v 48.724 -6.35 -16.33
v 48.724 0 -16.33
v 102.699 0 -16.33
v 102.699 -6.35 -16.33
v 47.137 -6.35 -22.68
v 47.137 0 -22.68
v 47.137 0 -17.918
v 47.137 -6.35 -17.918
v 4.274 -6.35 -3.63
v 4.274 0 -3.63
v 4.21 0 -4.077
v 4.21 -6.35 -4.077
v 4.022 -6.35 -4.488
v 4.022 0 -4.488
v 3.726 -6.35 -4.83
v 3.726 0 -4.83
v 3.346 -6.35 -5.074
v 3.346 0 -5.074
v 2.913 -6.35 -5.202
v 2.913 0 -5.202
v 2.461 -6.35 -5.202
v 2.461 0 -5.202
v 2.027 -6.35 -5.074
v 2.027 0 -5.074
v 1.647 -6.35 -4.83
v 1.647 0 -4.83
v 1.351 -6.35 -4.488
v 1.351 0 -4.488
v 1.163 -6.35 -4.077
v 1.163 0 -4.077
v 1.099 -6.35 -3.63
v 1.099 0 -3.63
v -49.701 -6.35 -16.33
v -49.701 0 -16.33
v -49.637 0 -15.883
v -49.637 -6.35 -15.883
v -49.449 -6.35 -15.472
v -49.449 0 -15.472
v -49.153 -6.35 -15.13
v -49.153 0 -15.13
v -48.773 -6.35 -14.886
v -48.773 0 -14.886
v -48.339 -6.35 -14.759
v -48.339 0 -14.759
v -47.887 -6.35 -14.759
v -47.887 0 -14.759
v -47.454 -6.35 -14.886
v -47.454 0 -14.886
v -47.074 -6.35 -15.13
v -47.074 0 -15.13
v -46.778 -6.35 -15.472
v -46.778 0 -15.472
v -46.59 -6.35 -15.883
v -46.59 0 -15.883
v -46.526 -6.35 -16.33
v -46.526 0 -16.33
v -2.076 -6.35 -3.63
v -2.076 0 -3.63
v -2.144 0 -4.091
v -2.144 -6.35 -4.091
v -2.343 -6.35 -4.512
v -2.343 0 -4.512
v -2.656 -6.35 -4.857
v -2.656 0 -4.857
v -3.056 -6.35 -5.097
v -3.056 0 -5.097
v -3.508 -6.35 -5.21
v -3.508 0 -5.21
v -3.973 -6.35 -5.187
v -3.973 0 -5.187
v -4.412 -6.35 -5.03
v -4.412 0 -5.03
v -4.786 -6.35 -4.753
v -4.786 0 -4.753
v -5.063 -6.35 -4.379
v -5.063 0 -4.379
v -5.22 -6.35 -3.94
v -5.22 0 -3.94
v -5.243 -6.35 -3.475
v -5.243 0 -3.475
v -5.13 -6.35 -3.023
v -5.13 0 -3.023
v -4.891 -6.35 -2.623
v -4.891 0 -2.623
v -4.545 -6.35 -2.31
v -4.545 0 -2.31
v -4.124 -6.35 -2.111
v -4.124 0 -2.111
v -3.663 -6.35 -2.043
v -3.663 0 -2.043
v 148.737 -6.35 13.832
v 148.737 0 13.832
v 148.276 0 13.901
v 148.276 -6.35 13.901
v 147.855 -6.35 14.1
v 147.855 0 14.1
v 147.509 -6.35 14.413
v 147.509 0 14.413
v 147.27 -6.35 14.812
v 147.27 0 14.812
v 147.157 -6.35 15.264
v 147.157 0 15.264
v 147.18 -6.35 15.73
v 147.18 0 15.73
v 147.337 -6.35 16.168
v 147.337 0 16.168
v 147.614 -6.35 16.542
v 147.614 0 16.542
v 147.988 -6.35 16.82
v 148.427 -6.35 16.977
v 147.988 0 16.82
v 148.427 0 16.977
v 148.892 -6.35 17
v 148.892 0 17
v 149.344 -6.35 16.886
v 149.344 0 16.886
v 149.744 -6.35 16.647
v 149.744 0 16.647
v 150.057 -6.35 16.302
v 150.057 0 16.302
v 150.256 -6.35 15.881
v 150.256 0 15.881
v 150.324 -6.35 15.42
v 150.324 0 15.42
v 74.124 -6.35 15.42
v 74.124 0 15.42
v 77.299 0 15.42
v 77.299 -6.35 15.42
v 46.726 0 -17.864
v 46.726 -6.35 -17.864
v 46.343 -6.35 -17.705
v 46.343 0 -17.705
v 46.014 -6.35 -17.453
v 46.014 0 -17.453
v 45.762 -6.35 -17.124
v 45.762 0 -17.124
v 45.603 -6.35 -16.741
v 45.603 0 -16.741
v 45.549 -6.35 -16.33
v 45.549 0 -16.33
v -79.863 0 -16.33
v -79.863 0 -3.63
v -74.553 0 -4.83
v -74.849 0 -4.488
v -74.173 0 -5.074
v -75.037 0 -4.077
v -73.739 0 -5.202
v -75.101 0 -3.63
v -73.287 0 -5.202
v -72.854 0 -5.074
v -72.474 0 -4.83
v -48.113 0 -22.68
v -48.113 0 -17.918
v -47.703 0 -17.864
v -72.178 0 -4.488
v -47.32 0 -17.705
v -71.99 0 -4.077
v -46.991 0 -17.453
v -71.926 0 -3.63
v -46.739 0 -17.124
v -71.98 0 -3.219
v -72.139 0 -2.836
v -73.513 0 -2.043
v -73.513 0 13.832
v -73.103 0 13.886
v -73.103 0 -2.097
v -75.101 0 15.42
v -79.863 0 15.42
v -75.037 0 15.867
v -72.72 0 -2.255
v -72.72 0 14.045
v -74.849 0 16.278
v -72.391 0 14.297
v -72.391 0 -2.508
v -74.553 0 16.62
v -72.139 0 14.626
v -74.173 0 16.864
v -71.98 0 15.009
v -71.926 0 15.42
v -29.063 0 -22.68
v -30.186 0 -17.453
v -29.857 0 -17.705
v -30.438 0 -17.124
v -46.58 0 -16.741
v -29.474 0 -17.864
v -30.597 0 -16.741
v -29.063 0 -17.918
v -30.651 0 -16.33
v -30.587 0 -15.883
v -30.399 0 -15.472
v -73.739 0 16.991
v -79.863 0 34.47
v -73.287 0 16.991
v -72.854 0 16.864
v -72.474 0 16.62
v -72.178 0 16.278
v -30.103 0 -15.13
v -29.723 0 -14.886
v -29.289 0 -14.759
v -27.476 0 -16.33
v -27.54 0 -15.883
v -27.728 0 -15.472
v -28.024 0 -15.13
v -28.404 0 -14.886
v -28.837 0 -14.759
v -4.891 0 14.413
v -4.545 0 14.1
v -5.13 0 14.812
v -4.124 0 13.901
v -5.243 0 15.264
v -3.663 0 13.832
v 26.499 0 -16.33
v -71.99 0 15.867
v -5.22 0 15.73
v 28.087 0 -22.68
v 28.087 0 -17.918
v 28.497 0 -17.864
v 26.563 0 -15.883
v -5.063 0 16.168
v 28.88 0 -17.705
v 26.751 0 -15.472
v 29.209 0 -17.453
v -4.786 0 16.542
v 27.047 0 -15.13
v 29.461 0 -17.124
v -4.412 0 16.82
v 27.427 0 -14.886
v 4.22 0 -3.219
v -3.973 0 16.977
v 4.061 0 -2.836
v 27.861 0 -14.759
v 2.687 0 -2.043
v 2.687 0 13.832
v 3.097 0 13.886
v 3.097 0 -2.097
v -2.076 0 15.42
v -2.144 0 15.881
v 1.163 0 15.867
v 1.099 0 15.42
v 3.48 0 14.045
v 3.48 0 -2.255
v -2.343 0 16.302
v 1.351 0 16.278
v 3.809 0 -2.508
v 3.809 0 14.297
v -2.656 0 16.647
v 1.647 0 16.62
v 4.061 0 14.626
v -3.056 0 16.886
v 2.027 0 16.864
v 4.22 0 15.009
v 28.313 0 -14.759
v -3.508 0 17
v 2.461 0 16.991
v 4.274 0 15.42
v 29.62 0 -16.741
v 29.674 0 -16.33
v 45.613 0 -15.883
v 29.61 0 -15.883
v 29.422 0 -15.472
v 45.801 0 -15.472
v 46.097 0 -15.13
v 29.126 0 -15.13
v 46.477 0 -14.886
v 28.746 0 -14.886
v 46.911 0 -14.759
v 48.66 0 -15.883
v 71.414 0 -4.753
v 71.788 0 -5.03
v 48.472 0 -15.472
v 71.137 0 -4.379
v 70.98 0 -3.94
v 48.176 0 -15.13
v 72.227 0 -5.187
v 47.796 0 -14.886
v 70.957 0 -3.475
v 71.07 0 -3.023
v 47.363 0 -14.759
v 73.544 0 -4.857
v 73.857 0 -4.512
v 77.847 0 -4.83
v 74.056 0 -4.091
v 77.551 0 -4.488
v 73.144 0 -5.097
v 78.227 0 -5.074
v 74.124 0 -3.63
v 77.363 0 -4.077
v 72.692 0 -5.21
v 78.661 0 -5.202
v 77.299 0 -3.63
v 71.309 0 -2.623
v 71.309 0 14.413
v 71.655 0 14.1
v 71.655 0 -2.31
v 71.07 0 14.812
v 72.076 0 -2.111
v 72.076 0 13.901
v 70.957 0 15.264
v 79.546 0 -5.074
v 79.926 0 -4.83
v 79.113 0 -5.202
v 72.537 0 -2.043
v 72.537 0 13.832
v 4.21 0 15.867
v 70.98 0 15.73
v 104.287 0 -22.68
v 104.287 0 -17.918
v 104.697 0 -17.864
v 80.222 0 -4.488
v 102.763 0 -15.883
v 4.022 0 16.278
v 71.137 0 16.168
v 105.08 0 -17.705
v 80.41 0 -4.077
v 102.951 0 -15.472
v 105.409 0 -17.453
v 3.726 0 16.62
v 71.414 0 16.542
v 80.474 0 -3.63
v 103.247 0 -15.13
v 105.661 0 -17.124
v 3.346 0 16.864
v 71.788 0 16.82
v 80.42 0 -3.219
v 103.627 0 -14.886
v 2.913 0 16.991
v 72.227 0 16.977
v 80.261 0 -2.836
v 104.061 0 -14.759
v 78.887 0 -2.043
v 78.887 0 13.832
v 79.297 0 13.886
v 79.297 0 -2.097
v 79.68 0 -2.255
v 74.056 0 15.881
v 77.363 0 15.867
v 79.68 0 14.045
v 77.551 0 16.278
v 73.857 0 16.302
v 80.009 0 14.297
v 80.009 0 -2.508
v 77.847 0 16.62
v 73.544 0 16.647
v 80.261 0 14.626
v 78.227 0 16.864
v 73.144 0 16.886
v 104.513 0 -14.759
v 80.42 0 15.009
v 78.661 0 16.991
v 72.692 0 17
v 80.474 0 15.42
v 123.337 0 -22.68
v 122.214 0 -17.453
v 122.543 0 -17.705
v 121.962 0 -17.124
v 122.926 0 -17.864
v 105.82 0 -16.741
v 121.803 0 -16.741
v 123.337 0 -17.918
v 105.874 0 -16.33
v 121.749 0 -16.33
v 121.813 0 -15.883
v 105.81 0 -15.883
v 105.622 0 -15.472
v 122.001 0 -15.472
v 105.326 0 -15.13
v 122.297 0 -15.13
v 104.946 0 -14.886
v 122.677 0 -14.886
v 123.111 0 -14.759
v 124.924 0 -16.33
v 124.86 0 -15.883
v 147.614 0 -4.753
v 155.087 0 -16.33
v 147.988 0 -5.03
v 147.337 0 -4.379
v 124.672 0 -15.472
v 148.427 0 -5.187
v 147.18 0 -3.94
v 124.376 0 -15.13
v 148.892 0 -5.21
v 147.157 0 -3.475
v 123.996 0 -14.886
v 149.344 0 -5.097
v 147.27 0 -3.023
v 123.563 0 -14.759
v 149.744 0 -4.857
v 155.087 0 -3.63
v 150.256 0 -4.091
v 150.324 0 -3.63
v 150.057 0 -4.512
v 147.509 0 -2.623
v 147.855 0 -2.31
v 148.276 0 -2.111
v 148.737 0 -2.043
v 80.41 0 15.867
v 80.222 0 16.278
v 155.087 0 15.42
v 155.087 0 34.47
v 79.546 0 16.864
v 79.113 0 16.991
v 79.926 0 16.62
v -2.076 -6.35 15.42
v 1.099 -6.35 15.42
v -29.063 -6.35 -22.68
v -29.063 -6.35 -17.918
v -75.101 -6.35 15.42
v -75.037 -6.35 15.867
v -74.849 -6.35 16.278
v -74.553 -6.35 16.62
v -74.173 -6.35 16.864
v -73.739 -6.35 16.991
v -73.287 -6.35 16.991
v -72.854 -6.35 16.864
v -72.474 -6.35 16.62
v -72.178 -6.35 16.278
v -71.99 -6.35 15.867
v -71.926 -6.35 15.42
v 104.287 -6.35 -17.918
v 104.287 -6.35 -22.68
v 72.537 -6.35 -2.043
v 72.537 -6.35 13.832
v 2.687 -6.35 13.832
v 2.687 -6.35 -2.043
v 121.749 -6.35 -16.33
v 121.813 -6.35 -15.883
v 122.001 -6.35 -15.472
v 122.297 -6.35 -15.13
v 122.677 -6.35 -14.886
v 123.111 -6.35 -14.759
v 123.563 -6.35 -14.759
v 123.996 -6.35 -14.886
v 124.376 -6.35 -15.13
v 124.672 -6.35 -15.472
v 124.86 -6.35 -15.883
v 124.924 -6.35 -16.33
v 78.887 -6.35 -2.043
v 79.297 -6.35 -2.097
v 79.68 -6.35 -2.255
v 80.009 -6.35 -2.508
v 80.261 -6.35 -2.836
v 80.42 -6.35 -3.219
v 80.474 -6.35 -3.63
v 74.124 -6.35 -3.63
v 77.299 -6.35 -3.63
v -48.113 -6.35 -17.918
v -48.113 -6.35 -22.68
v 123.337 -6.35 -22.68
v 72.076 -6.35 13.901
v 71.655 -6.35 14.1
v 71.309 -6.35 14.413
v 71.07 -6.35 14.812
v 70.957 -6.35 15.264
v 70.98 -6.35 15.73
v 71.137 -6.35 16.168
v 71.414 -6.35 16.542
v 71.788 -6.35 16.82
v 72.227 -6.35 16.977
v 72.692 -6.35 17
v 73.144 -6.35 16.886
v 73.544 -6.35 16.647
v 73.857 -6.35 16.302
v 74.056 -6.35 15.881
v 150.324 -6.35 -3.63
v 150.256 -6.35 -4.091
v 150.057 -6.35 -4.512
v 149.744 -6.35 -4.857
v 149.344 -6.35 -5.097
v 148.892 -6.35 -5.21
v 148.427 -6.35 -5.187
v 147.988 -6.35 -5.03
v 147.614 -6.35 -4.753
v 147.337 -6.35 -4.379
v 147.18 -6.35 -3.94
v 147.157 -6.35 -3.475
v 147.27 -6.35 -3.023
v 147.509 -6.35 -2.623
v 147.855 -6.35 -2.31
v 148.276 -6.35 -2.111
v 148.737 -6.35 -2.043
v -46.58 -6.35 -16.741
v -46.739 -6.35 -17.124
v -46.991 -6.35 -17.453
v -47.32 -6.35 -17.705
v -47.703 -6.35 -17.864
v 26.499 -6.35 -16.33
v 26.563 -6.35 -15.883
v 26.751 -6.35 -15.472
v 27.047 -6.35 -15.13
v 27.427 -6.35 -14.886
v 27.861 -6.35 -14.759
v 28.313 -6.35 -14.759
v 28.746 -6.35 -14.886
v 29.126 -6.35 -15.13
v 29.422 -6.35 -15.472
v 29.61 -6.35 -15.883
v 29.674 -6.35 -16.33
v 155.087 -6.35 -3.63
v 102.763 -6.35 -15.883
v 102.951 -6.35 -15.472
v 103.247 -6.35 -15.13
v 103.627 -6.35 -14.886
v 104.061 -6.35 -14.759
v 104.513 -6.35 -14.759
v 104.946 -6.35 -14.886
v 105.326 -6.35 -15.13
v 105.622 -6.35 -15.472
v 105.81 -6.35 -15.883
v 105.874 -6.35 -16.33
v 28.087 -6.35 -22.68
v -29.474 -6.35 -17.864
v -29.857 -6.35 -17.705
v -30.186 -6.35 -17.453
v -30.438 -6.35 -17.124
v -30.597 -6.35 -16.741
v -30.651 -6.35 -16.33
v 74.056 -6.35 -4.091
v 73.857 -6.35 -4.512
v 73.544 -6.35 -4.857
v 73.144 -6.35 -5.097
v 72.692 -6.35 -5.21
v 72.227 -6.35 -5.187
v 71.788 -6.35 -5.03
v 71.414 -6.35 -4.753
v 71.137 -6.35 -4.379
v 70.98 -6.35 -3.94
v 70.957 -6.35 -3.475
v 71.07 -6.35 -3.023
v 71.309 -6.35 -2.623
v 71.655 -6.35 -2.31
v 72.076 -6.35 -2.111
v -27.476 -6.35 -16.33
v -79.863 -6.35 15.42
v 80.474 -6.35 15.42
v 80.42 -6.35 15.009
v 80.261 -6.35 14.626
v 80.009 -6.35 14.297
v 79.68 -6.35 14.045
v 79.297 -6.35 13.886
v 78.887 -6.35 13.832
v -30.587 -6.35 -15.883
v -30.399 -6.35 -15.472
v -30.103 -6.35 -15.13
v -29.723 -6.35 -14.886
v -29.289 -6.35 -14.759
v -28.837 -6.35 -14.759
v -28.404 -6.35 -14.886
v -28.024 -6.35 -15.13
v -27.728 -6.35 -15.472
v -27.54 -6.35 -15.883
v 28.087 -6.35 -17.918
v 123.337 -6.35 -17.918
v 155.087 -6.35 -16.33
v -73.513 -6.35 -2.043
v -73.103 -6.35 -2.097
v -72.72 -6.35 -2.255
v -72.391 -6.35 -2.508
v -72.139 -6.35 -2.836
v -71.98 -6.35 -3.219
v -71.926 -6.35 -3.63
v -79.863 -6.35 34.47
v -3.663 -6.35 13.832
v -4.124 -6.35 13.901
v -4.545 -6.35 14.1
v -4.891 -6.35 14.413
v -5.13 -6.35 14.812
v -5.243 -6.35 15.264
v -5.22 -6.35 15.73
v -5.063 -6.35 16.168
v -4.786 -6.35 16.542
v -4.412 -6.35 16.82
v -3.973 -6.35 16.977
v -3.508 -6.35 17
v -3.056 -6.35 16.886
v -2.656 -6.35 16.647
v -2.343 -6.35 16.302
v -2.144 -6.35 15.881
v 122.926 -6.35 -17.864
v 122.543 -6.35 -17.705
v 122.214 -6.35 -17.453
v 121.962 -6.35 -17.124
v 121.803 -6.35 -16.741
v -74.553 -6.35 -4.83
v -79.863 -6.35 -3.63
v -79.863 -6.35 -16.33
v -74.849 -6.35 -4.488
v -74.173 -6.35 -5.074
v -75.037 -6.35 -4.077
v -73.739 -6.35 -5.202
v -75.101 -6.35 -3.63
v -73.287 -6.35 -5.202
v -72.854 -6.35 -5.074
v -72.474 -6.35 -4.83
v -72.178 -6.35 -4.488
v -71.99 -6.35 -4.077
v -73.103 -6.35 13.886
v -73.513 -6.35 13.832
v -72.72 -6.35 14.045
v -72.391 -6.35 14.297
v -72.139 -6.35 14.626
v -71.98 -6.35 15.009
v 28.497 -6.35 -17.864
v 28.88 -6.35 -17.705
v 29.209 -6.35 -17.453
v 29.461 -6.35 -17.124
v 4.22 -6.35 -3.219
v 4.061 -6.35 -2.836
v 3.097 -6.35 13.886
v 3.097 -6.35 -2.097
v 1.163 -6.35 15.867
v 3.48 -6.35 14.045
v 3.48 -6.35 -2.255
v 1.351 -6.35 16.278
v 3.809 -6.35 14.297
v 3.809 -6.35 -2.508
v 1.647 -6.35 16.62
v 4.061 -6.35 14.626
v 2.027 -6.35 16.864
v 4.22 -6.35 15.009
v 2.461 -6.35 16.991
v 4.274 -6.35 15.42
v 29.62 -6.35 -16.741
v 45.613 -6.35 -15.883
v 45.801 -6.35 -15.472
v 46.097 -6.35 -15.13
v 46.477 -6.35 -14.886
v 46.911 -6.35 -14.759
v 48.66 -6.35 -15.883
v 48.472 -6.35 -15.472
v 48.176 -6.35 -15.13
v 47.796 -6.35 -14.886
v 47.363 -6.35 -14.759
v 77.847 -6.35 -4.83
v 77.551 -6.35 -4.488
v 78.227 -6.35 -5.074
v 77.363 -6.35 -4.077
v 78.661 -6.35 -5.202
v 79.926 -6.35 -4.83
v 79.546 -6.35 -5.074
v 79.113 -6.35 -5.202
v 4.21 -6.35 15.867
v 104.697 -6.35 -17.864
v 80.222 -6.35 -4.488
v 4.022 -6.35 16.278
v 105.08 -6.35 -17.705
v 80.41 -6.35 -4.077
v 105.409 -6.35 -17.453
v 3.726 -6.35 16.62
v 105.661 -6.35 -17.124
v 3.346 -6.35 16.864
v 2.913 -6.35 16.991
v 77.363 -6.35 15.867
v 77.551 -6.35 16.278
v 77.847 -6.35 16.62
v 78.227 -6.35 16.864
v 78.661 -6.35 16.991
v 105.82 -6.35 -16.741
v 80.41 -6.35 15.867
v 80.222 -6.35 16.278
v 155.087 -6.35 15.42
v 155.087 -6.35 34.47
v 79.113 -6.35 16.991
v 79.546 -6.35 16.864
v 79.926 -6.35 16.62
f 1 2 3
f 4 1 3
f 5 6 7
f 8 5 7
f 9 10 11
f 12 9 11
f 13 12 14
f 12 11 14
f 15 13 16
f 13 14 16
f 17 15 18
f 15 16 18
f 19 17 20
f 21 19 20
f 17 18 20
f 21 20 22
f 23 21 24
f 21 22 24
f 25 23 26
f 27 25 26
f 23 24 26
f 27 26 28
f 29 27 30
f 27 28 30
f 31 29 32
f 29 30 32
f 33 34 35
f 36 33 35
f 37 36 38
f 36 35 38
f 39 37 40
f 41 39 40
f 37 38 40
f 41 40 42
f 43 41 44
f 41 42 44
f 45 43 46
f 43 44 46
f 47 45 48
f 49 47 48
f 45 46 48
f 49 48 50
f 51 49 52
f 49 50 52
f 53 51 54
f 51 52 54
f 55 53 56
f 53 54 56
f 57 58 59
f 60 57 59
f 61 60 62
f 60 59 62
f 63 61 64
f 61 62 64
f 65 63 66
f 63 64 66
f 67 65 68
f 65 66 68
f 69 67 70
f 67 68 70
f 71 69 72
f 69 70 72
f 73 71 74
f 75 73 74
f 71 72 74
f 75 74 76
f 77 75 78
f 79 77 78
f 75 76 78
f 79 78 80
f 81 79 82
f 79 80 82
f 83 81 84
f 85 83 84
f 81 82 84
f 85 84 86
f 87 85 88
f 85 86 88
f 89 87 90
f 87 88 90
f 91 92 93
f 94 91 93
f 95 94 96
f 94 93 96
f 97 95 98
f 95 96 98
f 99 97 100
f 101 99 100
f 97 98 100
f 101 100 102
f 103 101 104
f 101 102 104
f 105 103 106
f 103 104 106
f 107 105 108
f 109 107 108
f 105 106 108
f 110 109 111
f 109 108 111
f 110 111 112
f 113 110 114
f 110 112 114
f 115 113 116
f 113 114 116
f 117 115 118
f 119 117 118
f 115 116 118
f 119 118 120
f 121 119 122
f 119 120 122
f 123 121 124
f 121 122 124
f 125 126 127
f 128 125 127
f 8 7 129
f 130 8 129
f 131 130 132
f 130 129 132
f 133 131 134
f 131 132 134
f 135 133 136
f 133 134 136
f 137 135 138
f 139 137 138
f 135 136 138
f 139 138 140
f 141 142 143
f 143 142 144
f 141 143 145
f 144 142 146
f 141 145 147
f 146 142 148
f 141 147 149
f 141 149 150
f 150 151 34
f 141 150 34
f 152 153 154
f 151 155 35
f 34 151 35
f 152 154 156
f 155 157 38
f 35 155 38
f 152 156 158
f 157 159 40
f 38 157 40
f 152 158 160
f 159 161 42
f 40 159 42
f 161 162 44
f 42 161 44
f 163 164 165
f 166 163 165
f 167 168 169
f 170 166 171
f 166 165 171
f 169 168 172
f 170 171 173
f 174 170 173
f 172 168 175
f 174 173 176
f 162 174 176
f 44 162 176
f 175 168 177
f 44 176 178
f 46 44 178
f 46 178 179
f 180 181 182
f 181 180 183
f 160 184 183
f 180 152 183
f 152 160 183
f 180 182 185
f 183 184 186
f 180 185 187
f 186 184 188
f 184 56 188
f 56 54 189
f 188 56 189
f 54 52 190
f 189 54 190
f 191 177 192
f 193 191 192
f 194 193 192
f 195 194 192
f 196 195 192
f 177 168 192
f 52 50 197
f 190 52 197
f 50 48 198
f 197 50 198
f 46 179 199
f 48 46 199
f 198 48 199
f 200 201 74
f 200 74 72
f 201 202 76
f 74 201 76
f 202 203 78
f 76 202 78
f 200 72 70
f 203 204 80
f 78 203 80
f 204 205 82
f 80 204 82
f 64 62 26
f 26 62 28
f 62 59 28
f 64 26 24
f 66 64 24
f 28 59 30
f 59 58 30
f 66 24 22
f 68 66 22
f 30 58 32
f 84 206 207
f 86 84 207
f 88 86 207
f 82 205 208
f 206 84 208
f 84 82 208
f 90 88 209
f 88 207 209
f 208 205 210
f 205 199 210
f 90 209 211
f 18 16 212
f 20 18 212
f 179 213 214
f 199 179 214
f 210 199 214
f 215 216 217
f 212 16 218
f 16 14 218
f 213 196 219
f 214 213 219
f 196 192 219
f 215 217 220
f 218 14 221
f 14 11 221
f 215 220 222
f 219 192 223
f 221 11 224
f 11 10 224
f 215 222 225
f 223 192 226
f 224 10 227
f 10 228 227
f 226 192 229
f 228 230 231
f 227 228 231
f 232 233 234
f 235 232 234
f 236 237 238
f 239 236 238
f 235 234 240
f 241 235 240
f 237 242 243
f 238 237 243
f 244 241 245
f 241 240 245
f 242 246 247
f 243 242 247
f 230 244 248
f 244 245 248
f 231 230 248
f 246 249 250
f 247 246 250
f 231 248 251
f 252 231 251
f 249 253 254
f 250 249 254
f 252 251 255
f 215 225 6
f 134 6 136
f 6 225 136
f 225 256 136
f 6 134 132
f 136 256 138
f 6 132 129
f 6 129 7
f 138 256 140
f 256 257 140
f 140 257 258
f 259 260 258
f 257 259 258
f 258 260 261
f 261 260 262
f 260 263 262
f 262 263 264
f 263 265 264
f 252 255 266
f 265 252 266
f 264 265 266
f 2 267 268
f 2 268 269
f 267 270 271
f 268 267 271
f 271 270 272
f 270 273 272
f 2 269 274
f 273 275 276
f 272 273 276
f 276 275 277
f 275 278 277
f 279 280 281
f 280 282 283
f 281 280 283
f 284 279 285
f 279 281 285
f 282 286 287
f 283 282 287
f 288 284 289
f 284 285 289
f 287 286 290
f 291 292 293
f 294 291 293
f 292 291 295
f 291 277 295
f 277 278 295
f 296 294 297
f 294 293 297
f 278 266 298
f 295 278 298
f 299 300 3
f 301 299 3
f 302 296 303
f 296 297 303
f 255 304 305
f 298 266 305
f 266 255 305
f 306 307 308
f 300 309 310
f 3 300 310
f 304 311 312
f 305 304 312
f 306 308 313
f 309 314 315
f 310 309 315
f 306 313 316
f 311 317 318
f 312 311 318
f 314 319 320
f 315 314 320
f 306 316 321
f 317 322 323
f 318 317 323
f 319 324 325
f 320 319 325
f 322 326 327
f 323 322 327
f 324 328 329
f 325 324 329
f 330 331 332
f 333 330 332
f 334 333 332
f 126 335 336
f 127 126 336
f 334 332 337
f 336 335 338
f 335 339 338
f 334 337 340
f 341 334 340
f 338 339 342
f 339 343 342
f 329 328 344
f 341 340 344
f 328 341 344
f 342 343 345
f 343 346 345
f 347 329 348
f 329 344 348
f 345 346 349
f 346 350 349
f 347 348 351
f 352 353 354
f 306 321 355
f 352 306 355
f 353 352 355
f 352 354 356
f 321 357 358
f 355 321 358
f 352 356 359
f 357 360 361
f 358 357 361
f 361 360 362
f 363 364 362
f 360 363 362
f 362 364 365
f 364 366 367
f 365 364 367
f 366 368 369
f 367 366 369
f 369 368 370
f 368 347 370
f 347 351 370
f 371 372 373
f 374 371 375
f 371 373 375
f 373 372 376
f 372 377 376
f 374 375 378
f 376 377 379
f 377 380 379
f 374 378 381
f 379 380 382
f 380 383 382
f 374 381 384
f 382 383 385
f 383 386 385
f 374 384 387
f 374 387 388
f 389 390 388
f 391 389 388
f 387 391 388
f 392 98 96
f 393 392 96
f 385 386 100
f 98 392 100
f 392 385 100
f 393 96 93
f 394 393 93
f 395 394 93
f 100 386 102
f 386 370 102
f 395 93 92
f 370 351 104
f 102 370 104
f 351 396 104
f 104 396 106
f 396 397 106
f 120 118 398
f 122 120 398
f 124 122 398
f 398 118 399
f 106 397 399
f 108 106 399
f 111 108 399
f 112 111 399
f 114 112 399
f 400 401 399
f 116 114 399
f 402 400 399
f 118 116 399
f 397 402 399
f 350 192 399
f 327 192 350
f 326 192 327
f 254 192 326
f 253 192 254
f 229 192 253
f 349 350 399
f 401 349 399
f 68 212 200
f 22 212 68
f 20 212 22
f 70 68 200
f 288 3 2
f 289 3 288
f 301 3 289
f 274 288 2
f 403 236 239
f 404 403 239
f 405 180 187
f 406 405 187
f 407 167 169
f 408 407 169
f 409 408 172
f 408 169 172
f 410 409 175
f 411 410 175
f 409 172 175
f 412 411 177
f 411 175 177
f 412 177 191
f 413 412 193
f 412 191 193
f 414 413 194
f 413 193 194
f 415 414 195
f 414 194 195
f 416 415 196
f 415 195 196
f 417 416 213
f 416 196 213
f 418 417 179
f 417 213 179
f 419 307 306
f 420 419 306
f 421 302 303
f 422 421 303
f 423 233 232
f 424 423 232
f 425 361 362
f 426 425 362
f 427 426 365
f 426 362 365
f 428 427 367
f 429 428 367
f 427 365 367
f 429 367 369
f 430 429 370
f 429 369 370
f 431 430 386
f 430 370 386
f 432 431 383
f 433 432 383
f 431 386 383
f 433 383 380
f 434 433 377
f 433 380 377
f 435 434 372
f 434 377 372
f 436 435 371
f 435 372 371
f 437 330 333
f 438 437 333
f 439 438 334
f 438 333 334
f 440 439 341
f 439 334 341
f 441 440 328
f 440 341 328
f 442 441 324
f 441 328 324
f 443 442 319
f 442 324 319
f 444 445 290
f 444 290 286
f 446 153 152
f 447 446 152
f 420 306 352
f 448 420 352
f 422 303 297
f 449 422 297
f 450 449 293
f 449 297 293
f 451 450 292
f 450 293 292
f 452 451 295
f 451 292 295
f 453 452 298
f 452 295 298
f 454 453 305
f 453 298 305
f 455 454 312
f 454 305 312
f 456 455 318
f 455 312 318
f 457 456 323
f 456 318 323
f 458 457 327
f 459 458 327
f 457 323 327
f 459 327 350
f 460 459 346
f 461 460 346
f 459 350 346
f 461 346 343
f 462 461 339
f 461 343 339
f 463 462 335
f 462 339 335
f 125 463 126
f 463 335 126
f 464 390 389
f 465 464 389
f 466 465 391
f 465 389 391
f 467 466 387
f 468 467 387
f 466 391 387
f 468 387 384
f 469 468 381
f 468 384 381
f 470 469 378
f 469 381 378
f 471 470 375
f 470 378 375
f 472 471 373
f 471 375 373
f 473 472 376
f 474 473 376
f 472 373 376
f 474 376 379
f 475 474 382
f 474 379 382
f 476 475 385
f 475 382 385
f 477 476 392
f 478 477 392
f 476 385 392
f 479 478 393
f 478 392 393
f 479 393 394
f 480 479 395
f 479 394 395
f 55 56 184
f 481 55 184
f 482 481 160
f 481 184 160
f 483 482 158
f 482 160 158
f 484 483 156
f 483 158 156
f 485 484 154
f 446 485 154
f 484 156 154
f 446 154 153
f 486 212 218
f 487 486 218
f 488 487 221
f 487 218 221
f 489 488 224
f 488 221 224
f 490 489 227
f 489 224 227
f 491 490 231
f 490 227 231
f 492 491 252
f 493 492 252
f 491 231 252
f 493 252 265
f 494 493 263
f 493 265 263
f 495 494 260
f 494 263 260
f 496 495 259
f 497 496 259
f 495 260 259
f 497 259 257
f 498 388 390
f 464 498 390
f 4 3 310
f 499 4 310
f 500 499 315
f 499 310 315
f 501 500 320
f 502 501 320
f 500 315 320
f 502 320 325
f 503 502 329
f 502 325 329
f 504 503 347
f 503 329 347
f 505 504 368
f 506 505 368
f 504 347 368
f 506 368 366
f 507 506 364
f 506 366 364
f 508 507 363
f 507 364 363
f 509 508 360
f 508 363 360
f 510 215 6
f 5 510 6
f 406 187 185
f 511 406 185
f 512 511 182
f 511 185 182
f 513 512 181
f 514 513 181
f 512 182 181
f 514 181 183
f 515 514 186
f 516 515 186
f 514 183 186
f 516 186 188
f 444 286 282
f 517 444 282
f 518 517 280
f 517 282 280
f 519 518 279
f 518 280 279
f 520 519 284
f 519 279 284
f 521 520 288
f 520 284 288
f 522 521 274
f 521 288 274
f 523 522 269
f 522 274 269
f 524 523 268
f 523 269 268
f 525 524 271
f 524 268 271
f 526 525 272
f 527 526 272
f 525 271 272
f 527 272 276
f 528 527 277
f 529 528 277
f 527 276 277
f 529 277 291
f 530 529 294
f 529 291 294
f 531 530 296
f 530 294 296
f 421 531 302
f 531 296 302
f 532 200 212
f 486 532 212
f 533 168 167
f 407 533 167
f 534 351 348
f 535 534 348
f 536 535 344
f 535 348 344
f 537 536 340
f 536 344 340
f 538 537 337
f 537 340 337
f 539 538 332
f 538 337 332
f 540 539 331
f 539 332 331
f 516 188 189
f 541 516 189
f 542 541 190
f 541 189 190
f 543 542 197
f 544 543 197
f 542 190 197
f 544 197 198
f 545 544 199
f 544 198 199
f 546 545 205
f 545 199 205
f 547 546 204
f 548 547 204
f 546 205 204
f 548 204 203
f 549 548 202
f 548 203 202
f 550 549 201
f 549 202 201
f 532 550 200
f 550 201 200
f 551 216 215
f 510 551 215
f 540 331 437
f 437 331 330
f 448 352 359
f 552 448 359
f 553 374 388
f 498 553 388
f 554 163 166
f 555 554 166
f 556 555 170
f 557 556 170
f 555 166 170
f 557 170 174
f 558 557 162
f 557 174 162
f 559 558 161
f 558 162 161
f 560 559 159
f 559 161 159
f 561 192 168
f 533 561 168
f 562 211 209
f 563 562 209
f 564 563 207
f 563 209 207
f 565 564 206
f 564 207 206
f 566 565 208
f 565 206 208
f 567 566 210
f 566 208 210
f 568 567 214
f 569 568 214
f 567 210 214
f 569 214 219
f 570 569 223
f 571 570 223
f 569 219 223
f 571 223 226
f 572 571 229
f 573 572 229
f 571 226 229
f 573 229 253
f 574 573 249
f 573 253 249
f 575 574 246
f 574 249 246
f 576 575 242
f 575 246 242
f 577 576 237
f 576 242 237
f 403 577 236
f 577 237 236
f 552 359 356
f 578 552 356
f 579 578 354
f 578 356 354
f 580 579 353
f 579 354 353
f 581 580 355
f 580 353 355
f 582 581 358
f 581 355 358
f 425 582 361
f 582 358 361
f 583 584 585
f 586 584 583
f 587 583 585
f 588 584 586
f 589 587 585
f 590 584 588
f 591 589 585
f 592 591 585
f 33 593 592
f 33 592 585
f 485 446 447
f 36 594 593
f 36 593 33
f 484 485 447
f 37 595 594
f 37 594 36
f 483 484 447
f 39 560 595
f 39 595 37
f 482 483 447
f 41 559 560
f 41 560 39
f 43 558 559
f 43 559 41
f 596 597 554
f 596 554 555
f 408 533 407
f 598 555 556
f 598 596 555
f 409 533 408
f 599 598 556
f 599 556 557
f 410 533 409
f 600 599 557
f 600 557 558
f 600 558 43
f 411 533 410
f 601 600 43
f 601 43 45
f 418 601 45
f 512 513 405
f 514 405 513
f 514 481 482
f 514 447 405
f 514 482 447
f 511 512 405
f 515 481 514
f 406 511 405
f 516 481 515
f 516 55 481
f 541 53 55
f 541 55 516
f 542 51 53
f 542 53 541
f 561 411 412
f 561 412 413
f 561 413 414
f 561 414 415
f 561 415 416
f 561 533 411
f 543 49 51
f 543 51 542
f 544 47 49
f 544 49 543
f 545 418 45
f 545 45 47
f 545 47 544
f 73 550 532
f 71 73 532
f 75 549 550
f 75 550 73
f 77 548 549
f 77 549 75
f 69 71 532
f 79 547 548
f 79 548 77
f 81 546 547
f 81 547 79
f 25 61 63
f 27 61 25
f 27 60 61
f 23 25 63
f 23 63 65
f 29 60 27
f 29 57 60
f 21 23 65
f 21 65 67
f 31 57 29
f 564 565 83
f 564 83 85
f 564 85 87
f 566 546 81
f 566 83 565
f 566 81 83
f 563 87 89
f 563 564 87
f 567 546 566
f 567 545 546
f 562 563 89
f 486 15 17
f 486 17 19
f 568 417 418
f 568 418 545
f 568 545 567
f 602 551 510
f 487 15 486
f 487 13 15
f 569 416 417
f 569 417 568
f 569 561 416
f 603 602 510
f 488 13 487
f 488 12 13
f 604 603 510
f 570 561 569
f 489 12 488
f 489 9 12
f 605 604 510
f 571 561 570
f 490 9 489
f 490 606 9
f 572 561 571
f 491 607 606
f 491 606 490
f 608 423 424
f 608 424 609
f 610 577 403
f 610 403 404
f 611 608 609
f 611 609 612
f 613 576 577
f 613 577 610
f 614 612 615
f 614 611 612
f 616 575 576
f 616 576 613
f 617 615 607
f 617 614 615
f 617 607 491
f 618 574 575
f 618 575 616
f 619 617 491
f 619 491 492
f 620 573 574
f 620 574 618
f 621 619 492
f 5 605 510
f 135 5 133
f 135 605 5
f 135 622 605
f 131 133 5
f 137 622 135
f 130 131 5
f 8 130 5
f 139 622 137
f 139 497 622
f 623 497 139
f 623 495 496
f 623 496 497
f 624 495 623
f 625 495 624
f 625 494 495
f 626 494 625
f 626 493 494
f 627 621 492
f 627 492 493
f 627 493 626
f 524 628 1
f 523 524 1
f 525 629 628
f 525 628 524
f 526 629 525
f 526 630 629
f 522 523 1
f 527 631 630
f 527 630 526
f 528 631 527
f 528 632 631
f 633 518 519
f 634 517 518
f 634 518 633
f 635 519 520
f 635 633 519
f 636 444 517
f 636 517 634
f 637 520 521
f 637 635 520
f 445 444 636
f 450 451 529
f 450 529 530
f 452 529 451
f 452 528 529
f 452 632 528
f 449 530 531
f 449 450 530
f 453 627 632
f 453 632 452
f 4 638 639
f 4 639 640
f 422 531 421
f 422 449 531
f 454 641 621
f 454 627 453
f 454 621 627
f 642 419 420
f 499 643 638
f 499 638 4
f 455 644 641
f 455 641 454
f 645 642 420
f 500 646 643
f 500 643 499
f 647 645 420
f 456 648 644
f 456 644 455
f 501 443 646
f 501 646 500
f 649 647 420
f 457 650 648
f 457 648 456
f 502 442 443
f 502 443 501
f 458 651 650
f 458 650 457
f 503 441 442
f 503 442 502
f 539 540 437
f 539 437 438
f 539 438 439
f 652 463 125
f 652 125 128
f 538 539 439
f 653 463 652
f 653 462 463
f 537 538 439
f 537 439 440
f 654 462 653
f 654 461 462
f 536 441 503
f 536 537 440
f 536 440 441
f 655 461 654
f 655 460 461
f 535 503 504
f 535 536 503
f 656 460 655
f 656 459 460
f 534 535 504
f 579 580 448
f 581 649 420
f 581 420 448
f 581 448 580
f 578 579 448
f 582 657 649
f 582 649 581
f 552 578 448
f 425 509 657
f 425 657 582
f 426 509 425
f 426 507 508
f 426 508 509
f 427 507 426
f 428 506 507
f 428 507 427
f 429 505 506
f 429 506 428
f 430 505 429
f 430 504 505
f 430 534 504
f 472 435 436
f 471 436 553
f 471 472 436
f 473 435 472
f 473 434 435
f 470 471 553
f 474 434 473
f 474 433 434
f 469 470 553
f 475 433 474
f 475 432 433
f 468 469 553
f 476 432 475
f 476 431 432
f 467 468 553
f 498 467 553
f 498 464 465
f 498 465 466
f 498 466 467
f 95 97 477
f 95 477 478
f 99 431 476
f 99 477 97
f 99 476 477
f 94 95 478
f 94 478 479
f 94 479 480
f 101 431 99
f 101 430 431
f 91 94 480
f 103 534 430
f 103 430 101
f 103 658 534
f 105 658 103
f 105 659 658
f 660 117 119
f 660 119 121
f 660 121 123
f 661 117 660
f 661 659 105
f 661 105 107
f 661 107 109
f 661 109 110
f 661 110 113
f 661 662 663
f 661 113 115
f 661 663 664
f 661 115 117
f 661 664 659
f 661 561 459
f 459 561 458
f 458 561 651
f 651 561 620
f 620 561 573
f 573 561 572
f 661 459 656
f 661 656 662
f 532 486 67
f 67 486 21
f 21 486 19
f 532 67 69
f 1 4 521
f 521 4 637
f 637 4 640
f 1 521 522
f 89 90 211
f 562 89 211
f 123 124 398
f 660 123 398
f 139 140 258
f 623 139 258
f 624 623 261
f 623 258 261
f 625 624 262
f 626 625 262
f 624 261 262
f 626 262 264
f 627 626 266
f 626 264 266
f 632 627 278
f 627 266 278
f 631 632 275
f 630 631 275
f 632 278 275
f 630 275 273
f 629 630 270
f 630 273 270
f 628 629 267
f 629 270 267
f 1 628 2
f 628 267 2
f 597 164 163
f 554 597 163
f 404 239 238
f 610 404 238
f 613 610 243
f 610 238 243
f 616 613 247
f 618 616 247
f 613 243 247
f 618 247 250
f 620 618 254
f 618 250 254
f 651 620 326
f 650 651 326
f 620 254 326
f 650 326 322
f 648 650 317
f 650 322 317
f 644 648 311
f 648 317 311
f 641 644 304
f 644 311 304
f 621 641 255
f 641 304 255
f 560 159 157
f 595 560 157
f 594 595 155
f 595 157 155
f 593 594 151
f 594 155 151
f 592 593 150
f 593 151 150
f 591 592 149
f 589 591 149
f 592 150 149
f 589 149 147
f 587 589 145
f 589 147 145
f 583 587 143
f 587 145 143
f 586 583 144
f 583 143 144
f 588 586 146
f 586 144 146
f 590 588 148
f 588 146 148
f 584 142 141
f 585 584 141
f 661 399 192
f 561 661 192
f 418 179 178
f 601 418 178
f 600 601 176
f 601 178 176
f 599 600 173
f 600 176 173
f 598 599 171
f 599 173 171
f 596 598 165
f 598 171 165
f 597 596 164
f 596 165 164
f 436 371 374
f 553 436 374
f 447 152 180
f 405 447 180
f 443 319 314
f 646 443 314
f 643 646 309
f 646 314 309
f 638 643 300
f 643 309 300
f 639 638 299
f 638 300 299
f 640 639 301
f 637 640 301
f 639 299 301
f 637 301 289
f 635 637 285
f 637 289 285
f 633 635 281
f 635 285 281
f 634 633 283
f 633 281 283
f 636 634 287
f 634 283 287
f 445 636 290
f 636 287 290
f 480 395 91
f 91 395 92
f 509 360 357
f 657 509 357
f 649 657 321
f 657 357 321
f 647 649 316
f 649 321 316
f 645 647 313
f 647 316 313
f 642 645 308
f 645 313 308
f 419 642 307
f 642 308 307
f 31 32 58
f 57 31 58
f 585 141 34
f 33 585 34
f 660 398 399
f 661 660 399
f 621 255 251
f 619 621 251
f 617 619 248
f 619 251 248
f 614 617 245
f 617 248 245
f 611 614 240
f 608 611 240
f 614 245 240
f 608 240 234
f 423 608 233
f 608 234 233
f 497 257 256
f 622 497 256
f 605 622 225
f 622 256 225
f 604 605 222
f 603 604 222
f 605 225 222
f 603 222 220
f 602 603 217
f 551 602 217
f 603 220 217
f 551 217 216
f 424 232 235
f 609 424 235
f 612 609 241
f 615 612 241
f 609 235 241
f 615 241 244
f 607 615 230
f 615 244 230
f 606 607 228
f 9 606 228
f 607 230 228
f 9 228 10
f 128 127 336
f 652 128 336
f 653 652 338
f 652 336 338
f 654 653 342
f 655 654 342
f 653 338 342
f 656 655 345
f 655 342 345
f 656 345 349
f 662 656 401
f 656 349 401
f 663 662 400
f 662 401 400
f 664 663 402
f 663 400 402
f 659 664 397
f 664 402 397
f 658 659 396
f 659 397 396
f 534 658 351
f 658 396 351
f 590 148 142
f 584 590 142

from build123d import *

# Parameters (mm, degrees)
F1_DEPTH = 6.35


with BuildPart() as f1:
    # F0 (on Front) → F1 (new body)
    with BuildSketch(Plane.XZ):
        with BuildLine():
            Line((155.086583, 34.469813), (-79.863417, 34.469813))
            Line((-79.863417, 34.469813), (-79.863417, 15.419813))
            Line((-79.863417, 15.419813), (-75.100917, 15.419813))
            ThreePointArc((-75.100917, 15.419813), (-73.513417, 17.007313), (-71.925917, 15.419813))
            ThreePointArc((-71.925917, 15.419813), (-72.390885, 14.297281), (-73.513417, 13.832313))
            Line((-73.513417, 13.832313), (-73.513417, -2.042687))
            ThreePointArc((-73.513417, -2.042687), (-72.390885, -2.507655), (-71.925917, -3.630187))
            ThreePointArc((-71.925917, -3.630187), (-73.513417, -5.217687), (-75.100917, -3.630187))
            Line((-75.100917, -3.630187), (-79.863417, -3.630187))
            Line((-79.863417, -3.630187), (-79.863417, -16.330187))
            Line((-79.863417, -16.330187), (-49.700917, -16.330187))
            ThreePointArc((-49.700917, -16.330187), (-48.113417, -14.742687), (-46.525917, -16.330187))
            Line((-46.525917, -16.330187), (-30.650917, -16.330187))
            ThreePointArc((-30.650917, -16.330187), (-29.063417, -14.742687), (-27.475917, -16.330187))
            Line((-27.475917, -16.330187), (26.499083, -16.330187))
            ThreePointArc((26.499083, -16.330187), (28.086583, -14.742687), (29.674083, -16.330187))
            Line((29.674083, -16.330187), (45.549083, -16.330187))
            ThreePointArc((45.549083, -16.330187), (47.136583, -14.742687), (48.724083, -16.330187))
            Line((48.724083, -16.330187), (102.699083, -16.330187))
            ThreePointArc((102.699083, -16.330187), (104.286583, -14.742687), (105.874083, -16.330187))
            Line((105.874083, -16.330187), (121.749083, -16.330187))
            ThreePointArc((121.749083, -16.330187), (123.336583, -14.742687), (124.924083, -16.330187))
            Line((124.924083, -16.330187), (155.086583, -16.330187))
            Line((155.086583, -16.330187), (155.086583, -3.630187))
            Line((155.086583, -3.630187), (150.324083, -3.630187))
            ThreePointArc((150.324083, -3.630187), (147.614051, -4.752719), (148.736583, -2.042687))
            Line((148.736583, -2.042687), (148.736583, 13.832313))
            ThreePointArc((148.736583, 13.832313), (147.614051, 16.542345), (150.324083, 15.419813))
            Line((150.324083, 15.419813), (155.086583, 15.419813))
            Line((155.086583, 15.419813), (155.086583, 34.469813))
        make_face()
        with BuildLine():
            ThreePointArc((-3.663417, 13.832313), (-4.785949, 16.542345), (-2.075917, 15.419813))
            Line((-2.075917, 15.419813), (1.099083, 15.419813))
            ThreePointArc((1.099083, 15.419813), (2.686583, 17.007313), (4.274083, 15.419813))
            ThreePointArc((4.274083, 15.419813), (3.809115, 14.297281), (2.686583, 13.832313))
            Line((2.686583, 13.832313), (2.686583, -2.042687))
            ThreePointArc((2.686583, -2.042687), (3.809115, -2.507655), (4.274083, -3.630187))
            ThreePointArc((4.274083, -3.630187), (2.686583, -5.217687), (1.099083, -3.630187))
            Line((1.099083, -3.630187), (-2.075917, -3.630187))
            ThreePointArc((-2.075917, -3.630187), (-4.785949, -4.752719), (-3.663417, -2.042687))
            Line((-3.663417, -2.042687), (-3.663417, 13.832313))
        make_face(mode=Mode.SUBTRACT)
        with BuildLine():
            ThreePointArc((72.536583, 13.832313), (71.414051, 16.542345), (74.124083, 15.419813))
            Line((74.124083, 15.419813), (77.299083, 15.419813))
            ThreePointArc((77.299083, 15.419813), (78.886583, 17.007313), (80.474083, 15.419813))
            ThreePointArc((80.474083, 15.419813), (80.009115, 14.297281), (78.886583, 13.832313))
            Line((78.886583, 13.832313), (78.886583, -2.042687))
            ThreePointArc((78.886583, -2.042687), (80.009115, -2.507655), (80.474083, -3.630187))
            ThreePointArc((80.474083, -3.630187), (78.886583, -5.217687), (77.299083, -3.630187))
            Line((77.299083, -3.630187), (74.124083, -3.630187))
            ThreePointArc((74.124083, -3.630187), (71.414051, -4.752719), (72.536583, -2.042687))
            Line((72.536583, -2.042687), (72.536583, 13.832313))
        make_face(mode=Mode.SUBTRACT)
        with BuildLine():
            Line((-30.650917, -16.330187), (-46.525917, -16.330187))
            ThreePointArc((-46.525917, -16.330187), (-46.990885, -17.452719), (-48.113417, -17.917687))
            Line((-48.113417, -17.917687), (-48.113417, -22.680187))
            Line((-48.113417, -22.680187), (-29.063417, -22.680187))
            Line((-29.063417, -22.680187), (-29.063417, -17.917687))
            ThreePointArc((-29.063417, -17.917687), (-30.185949, -17.452719), (-30.650917, -16.330187))
        make_face()
        with BuildLine():
            Line((45.549083, -16.330187), (29.674083, -16.330187))
            ThreePointArc((29.674083, -16.330187), (29.209115, -17.452719), (28.086583, -17.917687))
            Line((28.086583, -17.917687), (28.086583, -22.680187))
            Line((28.086583, -22.680187), (47.136583, -22.680187))
            Line((47.136583, -22.680187), (47.136583, -17.917687))
            ThreePointArc((47.136583, -17.917687), (46.014051, -17.452719), (45.549083, -16.330187))
        make_face()
        with BuildLine():
            ThreePointArc((123.336583, -17.917687), (122.214051, -17.452719), (121.749083, -16.330187))
            Line((121.749083, -16.330187), (105.874083, -16.330187))
            ThreePointArc((105.874083, -16.330187), (105.409115, -17.452719), (104.286583, -17.917687))
            Line((104.286583, -17.917687), (104.286583, -22.680187))
            Line((104.286583, -22.680187), (123.336583, -22.680187))
            Line((123.336583, -22.680187), (123.336583, -17.917687))
        make_face()
    extrude(amount=F1_DEPTH)


solid = f1.part
